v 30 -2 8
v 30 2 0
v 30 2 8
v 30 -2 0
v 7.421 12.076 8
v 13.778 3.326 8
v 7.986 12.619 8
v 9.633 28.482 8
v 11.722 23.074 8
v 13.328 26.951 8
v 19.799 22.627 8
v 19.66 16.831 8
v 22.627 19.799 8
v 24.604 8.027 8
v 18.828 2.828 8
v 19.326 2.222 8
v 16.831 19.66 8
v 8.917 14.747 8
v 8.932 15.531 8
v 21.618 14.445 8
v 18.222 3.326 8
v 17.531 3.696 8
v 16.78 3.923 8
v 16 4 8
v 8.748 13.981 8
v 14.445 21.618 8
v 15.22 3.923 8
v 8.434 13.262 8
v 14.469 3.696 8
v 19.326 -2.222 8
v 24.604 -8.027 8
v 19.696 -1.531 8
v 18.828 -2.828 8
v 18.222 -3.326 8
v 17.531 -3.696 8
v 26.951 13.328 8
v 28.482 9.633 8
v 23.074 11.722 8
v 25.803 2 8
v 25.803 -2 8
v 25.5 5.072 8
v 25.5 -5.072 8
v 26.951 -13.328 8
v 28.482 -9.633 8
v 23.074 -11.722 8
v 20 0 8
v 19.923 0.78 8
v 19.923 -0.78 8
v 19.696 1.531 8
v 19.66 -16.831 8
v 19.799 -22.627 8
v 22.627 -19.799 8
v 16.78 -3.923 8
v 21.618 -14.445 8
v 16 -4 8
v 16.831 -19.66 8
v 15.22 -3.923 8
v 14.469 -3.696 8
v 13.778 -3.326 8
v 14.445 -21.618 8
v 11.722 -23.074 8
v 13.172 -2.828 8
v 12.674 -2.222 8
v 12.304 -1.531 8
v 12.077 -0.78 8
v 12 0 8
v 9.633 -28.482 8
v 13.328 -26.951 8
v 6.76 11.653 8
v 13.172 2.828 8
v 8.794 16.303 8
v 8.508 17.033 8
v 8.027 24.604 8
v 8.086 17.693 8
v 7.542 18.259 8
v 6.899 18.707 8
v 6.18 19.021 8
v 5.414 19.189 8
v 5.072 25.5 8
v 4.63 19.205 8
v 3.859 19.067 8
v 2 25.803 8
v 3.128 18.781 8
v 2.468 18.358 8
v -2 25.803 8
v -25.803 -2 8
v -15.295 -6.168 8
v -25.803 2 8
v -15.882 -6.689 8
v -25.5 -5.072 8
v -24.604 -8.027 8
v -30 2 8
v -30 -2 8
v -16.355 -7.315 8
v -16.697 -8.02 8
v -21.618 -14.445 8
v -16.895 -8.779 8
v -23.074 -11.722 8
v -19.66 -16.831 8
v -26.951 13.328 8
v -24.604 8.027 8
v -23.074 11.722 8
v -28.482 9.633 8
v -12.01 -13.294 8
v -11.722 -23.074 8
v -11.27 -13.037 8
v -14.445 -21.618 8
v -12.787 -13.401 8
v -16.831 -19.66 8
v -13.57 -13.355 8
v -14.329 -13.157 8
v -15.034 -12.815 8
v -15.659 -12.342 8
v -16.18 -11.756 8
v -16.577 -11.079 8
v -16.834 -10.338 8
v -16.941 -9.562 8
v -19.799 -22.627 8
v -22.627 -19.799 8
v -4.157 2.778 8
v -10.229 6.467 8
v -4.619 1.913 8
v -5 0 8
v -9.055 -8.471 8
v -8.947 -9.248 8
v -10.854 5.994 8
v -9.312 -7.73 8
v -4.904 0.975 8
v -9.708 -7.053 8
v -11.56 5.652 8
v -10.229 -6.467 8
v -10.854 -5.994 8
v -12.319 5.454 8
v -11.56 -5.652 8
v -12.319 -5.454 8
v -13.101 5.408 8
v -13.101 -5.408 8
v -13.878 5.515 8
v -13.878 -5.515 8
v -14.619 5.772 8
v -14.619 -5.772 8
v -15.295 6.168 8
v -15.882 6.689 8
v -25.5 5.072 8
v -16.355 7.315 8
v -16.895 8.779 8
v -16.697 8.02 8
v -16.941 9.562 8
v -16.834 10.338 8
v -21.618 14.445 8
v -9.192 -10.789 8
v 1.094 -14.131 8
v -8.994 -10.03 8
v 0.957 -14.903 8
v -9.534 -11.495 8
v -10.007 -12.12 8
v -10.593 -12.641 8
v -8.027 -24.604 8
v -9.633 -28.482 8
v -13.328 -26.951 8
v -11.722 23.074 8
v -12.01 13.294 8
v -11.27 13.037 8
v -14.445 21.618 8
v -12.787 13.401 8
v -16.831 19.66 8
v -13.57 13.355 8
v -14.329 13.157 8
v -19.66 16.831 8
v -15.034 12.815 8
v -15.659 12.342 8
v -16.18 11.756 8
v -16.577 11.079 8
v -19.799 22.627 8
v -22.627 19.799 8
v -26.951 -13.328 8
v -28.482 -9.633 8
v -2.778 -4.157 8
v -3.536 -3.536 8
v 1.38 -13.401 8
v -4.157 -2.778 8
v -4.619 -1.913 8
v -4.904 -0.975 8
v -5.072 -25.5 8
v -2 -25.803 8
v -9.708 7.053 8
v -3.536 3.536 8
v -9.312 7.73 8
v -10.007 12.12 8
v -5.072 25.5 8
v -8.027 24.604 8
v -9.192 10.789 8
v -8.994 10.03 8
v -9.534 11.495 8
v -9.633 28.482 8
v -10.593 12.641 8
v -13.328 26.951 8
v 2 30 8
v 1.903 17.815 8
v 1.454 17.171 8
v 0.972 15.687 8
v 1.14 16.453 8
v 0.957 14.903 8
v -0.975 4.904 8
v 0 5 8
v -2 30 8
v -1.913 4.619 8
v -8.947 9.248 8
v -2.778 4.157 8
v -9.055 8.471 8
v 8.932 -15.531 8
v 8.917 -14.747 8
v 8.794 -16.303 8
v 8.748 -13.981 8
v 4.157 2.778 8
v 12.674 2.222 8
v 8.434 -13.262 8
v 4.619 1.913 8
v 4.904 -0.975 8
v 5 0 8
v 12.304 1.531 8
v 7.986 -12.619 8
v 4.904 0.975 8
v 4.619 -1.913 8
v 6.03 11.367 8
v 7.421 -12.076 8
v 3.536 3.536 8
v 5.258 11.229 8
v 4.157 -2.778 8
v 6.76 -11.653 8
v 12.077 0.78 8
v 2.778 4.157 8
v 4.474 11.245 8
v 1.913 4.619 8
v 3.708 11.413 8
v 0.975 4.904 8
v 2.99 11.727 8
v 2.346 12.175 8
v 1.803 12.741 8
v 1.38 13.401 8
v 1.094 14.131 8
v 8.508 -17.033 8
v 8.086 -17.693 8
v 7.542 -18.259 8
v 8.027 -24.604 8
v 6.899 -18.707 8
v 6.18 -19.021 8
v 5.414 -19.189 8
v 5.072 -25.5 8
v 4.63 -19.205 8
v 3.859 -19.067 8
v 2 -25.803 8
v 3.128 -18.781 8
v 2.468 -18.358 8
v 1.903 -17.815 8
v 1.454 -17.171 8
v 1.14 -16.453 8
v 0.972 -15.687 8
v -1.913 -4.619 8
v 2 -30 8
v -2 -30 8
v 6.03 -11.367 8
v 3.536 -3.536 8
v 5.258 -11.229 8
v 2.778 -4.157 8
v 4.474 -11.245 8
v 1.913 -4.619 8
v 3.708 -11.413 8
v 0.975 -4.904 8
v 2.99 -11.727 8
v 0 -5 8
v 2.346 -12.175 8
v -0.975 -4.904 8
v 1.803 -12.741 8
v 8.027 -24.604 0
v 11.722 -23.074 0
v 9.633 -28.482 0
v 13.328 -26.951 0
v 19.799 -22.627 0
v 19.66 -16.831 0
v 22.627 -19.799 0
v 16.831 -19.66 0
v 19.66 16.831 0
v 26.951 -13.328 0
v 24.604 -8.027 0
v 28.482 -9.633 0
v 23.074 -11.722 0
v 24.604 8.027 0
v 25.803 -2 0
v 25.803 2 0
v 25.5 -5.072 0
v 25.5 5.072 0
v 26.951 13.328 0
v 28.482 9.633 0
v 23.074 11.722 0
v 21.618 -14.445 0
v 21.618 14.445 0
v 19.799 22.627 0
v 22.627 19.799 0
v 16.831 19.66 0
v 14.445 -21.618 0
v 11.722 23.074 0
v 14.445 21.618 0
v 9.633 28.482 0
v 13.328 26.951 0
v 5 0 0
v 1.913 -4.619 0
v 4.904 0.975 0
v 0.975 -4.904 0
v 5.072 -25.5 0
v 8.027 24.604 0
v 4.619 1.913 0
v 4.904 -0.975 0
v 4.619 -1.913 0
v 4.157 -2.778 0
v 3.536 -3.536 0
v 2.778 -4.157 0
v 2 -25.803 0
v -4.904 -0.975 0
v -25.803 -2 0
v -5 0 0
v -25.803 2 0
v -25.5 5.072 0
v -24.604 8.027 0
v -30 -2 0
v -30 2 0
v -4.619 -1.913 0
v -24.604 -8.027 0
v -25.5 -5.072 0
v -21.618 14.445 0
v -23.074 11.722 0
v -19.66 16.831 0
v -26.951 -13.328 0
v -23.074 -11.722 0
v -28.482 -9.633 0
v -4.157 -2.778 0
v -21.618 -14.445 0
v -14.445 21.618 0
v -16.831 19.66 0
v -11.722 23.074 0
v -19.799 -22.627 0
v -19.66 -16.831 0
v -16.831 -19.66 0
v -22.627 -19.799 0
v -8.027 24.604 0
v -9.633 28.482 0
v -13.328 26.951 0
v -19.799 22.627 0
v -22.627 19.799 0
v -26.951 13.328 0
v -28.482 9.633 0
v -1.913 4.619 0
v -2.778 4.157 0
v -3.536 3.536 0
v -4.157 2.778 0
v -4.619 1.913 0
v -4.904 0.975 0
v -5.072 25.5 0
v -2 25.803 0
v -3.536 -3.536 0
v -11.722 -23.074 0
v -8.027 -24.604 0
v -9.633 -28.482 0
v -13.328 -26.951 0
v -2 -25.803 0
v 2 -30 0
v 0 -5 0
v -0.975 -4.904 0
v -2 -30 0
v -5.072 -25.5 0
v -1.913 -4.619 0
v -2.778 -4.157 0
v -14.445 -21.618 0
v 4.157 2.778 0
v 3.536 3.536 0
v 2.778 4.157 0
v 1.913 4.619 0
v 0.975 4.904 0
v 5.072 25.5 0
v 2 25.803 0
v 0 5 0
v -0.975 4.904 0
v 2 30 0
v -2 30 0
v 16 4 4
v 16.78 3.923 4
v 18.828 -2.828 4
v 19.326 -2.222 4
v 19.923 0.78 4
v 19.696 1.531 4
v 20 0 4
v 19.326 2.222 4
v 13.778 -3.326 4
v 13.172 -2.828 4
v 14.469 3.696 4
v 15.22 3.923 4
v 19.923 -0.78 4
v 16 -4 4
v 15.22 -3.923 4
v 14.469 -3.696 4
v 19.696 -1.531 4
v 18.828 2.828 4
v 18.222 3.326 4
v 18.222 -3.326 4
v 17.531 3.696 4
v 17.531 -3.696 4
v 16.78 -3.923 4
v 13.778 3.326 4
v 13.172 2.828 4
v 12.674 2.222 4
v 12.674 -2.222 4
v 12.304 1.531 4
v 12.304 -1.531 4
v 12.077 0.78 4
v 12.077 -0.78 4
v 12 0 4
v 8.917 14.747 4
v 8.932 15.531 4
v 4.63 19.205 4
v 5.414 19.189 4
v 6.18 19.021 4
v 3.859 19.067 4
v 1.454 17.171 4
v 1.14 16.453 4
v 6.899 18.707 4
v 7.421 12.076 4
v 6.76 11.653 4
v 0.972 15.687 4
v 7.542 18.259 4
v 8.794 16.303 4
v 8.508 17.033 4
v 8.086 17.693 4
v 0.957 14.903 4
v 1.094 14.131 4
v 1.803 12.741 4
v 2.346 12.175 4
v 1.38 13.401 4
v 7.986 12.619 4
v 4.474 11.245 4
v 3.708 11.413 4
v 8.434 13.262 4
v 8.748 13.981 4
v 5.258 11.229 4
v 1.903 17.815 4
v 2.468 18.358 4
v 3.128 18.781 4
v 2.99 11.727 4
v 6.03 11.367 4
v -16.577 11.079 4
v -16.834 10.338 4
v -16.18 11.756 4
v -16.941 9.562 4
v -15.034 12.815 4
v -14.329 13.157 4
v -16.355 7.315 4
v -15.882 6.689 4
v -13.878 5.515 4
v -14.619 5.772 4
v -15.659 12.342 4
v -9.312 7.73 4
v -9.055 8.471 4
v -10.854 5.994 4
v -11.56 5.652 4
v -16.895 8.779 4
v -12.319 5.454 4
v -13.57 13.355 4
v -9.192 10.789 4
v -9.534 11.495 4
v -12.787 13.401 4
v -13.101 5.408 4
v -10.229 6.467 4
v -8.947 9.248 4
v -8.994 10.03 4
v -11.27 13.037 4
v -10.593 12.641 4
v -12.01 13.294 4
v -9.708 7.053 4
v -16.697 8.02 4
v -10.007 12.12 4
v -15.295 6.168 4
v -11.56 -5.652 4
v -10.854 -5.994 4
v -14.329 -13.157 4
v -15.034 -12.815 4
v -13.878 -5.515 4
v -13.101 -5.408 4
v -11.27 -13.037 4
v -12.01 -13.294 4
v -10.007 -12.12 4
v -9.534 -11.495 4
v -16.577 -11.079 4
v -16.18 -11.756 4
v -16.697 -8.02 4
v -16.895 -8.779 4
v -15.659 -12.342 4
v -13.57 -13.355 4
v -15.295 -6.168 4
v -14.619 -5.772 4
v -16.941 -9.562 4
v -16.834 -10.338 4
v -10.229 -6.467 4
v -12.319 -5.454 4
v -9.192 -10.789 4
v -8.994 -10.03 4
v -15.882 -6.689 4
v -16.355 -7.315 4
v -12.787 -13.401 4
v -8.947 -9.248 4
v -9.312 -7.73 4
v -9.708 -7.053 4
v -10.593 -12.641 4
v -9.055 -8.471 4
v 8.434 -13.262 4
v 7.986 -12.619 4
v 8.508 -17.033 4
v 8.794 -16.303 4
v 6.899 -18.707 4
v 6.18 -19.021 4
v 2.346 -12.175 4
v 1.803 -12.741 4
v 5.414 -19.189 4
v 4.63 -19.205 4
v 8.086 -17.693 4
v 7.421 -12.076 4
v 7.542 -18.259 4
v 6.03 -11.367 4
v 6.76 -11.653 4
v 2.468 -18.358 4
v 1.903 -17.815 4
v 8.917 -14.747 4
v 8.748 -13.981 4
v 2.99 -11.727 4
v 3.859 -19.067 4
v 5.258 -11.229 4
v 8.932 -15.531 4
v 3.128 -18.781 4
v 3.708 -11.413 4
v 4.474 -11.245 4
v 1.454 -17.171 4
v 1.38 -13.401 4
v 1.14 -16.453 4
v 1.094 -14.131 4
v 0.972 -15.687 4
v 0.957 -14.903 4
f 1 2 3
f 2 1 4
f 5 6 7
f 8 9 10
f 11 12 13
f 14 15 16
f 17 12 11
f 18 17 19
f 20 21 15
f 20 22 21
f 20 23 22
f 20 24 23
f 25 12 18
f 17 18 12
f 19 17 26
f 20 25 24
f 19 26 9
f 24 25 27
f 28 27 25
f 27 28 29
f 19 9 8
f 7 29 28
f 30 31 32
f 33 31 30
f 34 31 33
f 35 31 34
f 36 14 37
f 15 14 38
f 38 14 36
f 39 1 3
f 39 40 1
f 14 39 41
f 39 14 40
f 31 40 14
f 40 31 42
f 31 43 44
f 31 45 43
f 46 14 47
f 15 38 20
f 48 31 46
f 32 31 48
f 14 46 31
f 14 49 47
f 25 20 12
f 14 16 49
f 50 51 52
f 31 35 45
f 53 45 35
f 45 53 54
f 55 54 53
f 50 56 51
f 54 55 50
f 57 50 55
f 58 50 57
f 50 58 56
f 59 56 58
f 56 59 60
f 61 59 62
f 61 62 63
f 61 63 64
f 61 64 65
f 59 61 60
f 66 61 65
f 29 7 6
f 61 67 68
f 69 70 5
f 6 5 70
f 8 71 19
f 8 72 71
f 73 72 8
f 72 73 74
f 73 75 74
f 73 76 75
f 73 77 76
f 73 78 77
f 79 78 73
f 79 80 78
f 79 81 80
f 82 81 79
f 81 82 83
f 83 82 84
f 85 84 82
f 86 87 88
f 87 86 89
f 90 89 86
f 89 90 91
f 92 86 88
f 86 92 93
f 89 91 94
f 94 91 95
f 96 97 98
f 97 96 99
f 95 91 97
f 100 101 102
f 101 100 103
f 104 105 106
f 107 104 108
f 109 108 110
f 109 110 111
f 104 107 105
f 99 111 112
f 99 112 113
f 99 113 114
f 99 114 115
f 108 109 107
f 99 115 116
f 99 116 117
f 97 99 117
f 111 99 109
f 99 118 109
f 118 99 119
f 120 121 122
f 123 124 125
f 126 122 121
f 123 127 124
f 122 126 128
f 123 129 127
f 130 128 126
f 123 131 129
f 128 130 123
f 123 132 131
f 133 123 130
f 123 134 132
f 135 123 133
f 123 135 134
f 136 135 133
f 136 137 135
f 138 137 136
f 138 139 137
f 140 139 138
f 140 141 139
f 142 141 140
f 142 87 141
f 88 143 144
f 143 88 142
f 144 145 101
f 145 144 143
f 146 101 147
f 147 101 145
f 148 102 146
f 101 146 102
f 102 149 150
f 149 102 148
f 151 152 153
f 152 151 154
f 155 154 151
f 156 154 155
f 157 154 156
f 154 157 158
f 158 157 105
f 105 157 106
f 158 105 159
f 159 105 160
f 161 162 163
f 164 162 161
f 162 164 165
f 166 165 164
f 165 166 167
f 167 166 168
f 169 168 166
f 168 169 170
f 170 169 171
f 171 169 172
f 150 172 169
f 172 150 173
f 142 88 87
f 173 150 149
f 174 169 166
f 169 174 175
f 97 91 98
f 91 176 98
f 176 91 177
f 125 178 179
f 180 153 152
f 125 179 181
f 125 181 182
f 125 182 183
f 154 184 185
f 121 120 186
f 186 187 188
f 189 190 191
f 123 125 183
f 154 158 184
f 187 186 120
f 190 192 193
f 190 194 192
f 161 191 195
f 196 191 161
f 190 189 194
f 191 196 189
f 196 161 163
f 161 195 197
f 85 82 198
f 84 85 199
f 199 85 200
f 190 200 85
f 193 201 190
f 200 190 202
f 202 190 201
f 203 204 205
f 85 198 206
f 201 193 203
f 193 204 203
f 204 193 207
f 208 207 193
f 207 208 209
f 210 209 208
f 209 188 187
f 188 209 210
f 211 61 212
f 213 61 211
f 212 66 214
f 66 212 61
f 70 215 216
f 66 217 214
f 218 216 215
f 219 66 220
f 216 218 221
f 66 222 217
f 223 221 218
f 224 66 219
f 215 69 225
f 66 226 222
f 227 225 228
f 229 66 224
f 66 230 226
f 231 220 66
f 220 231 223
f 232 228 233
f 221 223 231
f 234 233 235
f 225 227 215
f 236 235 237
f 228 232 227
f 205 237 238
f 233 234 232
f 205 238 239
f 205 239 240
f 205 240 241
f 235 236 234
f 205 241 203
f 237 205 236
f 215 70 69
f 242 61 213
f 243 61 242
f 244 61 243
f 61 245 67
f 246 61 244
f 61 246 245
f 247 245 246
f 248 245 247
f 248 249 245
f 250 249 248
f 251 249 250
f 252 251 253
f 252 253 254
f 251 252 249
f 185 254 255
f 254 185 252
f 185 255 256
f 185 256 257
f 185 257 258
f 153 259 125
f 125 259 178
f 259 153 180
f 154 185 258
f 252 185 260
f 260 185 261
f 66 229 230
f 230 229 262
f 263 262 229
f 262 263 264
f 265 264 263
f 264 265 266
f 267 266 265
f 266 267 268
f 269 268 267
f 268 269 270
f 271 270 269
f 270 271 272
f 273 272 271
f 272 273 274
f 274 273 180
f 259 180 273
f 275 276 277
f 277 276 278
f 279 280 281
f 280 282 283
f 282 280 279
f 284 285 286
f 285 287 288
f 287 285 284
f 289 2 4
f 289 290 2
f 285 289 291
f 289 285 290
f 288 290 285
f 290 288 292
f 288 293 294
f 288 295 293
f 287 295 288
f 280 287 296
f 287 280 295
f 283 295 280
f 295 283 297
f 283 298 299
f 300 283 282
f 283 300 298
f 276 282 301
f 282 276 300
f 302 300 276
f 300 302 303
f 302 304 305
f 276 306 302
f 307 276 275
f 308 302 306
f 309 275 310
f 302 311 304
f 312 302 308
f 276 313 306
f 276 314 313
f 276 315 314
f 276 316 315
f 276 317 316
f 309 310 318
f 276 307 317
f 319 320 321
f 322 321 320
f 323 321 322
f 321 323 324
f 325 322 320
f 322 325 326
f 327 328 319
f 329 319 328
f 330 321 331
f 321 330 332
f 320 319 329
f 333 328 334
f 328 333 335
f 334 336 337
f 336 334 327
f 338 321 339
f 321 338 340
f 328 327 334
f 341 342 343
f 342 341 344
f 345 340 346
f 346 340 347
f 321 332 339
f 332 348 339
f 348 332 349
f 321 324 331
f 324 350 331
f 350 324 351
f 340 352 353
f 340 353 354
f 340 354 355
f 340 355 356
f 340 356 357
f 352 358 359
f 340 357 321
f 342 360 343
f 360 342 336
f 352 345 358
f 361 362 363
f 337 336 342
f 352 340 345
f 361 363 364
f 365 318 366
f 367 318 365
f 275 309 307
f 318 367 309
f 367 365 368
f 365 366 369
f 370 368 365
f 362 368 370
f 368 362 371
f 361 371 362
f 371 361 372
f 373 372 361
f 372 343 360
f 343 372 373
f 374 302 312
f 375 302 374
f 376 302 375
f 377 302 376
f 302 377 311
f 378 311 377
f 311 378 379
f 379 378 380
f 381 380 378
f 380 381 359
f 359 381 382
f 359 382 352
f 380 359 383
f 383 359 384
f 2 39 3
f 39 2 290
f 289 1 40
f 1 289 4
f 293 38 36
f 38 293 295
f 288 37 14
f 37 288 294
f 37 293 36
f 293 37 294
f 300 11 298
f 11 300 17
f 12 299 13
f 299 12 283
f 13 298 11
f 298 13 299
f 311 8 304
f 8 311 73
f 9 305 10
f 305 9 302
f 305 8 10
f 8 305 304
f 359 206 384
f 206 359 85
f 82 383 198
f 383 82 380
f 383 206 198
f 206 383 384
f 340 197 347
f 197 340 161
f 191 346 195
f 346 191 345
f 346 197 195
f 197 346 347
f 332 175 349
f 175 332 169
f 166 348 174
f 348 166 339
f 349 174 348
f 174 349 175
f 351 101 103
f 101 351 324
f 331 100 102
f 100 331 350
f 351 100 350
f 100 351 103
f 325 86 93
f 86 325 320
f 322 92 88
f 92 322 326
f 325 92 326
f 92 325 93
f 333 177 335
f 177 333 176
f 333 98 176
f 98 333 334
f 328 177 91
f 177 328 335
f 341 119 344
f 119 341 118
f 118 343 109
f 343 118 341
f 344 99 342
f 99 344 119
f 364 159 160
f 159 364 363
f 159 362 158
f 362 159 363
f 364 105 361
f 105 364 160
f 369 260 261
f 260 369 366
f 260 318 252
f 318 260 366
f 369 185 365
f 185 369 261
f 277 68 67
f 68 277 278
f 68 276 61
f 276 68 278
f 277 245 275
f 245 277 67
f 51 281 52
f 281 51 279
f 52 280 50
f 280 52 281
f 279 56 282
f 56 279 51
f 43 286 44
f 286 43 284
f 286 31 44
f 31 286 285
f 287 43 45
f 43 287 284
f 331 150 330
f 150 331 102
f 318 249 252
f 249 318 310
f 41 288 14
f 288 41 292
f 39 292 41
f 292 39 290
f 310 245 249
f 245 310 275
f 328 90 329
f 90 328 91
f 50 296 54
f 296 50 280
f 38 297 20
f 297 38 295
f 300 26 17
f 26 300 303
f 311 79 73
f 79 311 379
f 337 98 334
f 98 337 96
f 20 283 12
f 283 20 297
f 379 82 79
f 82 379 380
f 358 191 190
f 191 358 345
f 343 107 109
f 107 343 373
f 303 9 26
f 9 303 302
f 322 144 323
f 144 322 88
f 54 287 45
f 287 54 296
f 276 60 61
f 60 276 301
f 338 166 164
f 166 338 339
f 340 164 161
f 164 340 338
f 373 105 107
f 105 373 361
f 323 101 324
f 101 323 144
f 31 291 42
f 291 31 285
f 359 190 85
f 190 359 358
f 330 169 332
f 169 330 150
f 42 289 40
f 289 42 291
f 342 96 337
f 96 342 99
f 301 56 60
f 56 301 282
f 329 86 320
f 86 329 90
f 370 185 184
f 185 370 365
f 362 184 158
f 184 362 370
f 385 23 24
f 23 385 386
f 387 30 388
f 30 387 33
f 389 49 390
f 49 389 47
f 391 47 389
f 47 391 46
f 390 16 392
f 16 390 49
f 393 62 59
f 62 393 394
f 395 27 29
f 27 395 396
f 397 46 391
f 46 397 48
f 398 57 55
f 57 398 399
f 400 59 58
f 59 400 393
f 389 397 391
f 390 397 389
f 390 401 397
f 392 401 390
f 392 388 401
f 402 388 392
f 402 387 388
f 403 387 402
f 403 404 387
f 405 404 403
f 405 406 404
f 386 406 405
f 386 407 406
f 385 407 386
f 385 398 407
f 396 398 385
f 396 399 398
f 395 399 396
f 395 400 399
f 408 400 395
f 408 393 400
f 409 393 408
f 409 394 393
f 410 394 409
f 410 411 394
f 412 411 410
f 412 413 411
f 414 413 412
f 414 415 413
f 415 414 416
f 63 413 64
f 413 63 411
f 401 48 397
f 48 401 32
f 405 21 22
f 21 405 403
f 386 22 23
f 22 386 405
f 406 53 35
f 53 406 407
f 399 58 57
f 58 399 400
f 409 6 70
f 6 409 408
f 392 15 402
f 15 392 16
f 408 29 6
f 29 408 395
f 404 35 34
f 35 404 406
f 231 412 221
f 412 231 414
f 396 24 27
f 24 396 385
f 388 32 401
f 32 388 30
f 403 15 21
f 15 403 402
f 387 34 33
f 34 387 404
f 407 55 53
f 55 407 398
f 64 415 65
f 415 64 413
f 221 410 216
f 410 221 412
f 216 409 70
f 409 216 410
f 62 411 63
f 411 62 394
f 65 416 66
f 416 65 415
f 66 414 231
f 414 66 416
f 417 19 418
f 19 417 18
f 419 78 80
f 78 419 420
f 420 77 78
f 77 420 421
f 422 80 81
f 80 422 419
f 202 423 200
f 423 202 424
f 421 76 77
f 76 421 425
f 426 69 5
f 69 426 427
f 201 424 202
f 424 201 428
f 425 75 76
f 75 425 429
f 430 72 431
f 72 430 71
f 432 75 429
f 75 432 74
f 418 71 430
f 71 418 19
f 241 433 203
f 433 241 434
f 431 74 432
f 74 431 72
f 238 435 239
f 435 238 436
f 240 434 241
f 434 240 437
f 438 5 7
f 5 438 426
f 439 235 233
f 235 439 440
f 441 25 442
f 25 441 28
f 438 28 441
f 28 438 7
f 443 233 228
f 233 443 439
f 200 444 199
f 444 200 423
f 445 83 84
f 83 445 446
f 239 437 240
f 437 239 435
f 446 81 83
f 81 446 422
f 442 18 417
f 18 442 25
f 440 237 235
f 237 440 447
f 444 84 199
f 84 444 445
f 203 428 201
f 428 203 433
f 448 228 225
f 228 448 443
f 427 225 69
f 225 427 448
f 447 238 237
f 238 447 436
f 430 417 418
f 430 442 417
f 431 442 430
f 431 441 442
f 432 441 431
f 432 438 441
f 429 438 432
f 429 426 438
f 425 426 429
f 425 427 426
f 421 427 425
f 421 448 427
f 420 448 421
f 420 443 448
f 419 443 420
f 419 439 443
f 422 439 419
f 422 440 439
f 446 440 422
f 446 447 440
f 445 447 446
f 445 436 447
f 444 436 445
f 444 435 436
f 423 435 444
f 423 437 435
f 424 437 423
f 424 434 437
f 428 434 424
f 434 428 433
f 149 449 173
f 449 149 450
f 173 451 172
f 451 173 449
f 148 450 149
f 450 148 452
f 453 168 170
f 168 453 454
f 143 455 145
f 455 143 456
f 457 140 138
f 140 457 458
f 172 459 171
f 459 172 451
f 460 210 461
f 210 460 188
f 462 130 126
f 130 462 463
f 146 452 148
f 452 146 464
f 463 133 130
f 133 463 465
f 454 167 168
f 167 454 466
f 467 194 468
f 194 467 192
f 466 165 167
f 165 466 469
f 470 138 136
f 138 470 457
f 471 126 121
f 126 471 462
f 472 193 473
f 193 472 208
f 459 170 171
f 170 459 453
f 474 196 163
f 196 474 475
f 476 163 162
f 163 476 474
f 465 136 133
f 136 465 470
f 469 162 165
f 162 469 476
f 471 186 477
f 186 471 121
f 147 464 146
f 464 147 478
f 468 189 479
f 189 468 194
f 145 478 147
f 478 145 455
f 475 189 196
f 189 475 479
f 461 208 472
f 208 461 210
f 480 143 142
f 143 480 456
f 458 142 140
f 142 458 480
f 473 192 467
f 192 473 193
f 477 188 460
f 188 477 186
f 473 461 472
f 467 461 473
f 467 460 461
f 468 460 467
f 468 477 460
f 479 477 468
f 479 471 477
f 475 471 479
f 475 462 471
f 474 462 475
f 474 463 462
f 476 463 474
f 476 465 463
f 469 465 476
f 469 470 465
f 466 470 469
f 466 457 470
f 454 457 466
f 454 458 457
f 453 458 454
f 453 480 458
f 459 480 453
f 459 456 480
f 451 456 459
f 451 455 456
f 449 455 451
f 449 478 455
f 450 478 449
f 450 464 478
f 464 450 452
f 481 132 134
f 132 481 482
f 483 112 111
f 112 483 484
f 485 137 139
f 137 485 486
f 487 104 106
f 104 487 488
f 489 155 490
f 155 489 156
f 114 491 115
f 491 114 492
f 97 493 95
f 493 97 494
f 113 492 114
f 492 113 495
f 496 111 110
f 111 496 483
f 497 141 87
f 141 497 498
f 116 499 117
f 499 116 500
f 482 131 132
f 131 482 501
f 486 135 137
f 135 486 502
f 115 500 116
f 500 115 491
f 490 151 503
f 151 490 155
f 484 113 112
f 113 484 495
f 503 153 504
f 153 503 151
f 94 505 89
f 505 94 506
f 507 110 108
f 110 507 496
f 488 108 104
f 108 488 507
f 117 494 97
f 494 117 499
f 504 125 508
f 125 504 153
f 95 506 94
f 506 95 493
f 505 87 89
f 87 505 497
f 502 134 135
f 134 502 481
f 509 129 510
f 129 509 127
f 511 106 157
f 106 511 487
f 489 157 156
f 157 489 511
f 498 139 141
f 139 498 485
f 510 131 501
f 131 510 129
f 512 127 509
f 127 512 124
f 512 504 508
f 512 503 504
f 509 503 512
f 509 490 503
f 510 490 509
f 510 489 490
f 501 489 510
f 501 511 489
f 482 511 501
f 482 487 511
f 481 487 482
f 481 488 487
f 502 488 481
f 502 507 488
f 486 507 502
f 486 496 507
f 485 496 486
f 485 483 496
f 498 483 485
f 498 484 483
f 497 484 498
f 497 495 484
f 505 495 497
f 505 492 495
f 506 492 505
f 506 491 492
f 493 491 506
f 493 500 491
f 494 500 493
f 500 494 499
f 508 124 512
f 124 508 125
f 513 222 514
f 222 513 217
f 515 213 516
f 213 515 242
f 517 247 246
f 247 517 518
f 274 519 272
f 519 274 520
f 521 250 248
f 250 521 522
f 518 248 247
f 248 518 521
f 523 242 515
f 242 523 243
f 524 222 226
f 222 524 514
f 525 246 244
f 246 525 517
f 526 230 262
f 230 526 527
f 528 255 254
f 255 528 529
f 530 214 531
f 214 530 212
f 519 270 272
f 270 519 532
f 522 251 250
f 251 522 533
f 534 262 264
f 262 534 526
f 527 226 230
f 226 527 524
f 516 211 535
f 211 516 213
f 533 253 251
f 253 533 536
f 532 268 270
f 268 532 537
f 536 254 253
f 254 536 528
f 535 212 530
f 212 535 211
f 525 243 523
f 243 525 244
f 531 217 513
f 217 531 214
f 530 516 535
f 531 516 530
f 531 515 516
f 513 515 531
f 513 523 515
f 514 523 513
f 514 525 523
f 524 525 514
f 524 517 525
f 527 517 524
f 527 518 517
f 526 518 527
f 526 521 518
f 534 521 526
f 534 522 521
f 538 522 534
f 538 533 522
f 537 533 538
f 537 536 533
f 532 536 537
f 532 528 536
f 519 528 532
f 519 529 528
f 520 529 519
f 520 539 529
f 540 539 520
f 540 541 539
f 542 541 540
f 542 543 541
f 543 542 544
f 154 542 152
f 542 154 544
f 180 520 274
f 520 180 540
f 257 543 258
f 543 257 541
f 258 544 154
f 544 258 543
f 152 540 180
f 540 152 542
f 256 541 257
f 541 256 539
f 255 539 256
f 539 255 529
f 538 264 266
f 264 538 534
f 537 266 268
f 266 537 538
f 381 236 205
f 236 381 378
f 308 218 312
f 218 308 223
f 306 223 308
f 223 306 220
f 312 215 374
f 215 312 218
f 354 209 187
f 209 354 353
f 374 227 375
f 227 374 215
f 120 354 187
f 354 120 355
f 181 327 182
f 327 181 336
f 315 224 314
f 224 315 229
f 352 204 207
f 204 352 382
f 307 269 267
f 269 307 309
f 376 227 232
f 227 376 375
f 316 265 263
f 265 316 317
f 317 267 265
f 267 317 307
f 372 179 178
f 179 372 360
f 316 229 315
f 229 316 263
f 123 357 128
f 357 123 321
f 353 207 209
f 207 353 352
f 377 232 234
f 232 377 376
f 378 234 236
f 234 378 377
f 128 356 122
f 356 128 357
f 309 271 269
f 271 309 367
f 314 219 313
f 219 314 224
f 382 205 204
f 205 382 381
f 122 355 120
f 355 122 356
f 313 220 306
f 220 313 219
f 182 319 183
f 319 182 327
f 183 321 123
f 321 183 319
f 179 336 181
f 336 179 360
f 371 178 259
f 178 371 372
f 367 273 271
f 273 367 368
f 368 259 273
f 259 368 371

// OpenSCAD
$fn = 32;

// ----------------------------------------------------------------------
// Spur blank: lightened gear blank
// ----------------------------------------------------------------------

// --- parameters (mm) ---
disc_r = 26;              // blank root radius
disc_t = 8;               // blank thickness
n_teeth = 16;             // stub tooth count
tooth_w = 4;              // tooth width at the root
tooth_h = 4;              // tooth height above the root
bore_r = 5;               // central bore radius
ring_r = 16;              // lightening pocket ring radius
pocket_r = 4;             // lightening pocket radius

out_r = disc_r + tooth_h;  // tip radius
bbox_x = 60.0;  // measured width over the teeth
bbox_y = 60.0;  // measured depth over the teeth

difference() {
union() {
  cylinder(r = disc_r, h = disc_t);
  for (i = [0 : n_teeth - 1])
    rotate([0, 0, i * 360 / n_teeth])
      translate([disc_r - 1, -tooth_w / 2, 0])
        cube([tooth_h + 1, tooth_w, disc_t]);
}
  translate([0, 0, -1]) cylinder(r = bore_r, h = disc_t + 2);
  for (i = [0 : 5])
    rotate([0, 0, i * 72])
      translate([ring_r, 0, disc_t - 4])
        cylinder(r = pocket_r, h = 5);
}
